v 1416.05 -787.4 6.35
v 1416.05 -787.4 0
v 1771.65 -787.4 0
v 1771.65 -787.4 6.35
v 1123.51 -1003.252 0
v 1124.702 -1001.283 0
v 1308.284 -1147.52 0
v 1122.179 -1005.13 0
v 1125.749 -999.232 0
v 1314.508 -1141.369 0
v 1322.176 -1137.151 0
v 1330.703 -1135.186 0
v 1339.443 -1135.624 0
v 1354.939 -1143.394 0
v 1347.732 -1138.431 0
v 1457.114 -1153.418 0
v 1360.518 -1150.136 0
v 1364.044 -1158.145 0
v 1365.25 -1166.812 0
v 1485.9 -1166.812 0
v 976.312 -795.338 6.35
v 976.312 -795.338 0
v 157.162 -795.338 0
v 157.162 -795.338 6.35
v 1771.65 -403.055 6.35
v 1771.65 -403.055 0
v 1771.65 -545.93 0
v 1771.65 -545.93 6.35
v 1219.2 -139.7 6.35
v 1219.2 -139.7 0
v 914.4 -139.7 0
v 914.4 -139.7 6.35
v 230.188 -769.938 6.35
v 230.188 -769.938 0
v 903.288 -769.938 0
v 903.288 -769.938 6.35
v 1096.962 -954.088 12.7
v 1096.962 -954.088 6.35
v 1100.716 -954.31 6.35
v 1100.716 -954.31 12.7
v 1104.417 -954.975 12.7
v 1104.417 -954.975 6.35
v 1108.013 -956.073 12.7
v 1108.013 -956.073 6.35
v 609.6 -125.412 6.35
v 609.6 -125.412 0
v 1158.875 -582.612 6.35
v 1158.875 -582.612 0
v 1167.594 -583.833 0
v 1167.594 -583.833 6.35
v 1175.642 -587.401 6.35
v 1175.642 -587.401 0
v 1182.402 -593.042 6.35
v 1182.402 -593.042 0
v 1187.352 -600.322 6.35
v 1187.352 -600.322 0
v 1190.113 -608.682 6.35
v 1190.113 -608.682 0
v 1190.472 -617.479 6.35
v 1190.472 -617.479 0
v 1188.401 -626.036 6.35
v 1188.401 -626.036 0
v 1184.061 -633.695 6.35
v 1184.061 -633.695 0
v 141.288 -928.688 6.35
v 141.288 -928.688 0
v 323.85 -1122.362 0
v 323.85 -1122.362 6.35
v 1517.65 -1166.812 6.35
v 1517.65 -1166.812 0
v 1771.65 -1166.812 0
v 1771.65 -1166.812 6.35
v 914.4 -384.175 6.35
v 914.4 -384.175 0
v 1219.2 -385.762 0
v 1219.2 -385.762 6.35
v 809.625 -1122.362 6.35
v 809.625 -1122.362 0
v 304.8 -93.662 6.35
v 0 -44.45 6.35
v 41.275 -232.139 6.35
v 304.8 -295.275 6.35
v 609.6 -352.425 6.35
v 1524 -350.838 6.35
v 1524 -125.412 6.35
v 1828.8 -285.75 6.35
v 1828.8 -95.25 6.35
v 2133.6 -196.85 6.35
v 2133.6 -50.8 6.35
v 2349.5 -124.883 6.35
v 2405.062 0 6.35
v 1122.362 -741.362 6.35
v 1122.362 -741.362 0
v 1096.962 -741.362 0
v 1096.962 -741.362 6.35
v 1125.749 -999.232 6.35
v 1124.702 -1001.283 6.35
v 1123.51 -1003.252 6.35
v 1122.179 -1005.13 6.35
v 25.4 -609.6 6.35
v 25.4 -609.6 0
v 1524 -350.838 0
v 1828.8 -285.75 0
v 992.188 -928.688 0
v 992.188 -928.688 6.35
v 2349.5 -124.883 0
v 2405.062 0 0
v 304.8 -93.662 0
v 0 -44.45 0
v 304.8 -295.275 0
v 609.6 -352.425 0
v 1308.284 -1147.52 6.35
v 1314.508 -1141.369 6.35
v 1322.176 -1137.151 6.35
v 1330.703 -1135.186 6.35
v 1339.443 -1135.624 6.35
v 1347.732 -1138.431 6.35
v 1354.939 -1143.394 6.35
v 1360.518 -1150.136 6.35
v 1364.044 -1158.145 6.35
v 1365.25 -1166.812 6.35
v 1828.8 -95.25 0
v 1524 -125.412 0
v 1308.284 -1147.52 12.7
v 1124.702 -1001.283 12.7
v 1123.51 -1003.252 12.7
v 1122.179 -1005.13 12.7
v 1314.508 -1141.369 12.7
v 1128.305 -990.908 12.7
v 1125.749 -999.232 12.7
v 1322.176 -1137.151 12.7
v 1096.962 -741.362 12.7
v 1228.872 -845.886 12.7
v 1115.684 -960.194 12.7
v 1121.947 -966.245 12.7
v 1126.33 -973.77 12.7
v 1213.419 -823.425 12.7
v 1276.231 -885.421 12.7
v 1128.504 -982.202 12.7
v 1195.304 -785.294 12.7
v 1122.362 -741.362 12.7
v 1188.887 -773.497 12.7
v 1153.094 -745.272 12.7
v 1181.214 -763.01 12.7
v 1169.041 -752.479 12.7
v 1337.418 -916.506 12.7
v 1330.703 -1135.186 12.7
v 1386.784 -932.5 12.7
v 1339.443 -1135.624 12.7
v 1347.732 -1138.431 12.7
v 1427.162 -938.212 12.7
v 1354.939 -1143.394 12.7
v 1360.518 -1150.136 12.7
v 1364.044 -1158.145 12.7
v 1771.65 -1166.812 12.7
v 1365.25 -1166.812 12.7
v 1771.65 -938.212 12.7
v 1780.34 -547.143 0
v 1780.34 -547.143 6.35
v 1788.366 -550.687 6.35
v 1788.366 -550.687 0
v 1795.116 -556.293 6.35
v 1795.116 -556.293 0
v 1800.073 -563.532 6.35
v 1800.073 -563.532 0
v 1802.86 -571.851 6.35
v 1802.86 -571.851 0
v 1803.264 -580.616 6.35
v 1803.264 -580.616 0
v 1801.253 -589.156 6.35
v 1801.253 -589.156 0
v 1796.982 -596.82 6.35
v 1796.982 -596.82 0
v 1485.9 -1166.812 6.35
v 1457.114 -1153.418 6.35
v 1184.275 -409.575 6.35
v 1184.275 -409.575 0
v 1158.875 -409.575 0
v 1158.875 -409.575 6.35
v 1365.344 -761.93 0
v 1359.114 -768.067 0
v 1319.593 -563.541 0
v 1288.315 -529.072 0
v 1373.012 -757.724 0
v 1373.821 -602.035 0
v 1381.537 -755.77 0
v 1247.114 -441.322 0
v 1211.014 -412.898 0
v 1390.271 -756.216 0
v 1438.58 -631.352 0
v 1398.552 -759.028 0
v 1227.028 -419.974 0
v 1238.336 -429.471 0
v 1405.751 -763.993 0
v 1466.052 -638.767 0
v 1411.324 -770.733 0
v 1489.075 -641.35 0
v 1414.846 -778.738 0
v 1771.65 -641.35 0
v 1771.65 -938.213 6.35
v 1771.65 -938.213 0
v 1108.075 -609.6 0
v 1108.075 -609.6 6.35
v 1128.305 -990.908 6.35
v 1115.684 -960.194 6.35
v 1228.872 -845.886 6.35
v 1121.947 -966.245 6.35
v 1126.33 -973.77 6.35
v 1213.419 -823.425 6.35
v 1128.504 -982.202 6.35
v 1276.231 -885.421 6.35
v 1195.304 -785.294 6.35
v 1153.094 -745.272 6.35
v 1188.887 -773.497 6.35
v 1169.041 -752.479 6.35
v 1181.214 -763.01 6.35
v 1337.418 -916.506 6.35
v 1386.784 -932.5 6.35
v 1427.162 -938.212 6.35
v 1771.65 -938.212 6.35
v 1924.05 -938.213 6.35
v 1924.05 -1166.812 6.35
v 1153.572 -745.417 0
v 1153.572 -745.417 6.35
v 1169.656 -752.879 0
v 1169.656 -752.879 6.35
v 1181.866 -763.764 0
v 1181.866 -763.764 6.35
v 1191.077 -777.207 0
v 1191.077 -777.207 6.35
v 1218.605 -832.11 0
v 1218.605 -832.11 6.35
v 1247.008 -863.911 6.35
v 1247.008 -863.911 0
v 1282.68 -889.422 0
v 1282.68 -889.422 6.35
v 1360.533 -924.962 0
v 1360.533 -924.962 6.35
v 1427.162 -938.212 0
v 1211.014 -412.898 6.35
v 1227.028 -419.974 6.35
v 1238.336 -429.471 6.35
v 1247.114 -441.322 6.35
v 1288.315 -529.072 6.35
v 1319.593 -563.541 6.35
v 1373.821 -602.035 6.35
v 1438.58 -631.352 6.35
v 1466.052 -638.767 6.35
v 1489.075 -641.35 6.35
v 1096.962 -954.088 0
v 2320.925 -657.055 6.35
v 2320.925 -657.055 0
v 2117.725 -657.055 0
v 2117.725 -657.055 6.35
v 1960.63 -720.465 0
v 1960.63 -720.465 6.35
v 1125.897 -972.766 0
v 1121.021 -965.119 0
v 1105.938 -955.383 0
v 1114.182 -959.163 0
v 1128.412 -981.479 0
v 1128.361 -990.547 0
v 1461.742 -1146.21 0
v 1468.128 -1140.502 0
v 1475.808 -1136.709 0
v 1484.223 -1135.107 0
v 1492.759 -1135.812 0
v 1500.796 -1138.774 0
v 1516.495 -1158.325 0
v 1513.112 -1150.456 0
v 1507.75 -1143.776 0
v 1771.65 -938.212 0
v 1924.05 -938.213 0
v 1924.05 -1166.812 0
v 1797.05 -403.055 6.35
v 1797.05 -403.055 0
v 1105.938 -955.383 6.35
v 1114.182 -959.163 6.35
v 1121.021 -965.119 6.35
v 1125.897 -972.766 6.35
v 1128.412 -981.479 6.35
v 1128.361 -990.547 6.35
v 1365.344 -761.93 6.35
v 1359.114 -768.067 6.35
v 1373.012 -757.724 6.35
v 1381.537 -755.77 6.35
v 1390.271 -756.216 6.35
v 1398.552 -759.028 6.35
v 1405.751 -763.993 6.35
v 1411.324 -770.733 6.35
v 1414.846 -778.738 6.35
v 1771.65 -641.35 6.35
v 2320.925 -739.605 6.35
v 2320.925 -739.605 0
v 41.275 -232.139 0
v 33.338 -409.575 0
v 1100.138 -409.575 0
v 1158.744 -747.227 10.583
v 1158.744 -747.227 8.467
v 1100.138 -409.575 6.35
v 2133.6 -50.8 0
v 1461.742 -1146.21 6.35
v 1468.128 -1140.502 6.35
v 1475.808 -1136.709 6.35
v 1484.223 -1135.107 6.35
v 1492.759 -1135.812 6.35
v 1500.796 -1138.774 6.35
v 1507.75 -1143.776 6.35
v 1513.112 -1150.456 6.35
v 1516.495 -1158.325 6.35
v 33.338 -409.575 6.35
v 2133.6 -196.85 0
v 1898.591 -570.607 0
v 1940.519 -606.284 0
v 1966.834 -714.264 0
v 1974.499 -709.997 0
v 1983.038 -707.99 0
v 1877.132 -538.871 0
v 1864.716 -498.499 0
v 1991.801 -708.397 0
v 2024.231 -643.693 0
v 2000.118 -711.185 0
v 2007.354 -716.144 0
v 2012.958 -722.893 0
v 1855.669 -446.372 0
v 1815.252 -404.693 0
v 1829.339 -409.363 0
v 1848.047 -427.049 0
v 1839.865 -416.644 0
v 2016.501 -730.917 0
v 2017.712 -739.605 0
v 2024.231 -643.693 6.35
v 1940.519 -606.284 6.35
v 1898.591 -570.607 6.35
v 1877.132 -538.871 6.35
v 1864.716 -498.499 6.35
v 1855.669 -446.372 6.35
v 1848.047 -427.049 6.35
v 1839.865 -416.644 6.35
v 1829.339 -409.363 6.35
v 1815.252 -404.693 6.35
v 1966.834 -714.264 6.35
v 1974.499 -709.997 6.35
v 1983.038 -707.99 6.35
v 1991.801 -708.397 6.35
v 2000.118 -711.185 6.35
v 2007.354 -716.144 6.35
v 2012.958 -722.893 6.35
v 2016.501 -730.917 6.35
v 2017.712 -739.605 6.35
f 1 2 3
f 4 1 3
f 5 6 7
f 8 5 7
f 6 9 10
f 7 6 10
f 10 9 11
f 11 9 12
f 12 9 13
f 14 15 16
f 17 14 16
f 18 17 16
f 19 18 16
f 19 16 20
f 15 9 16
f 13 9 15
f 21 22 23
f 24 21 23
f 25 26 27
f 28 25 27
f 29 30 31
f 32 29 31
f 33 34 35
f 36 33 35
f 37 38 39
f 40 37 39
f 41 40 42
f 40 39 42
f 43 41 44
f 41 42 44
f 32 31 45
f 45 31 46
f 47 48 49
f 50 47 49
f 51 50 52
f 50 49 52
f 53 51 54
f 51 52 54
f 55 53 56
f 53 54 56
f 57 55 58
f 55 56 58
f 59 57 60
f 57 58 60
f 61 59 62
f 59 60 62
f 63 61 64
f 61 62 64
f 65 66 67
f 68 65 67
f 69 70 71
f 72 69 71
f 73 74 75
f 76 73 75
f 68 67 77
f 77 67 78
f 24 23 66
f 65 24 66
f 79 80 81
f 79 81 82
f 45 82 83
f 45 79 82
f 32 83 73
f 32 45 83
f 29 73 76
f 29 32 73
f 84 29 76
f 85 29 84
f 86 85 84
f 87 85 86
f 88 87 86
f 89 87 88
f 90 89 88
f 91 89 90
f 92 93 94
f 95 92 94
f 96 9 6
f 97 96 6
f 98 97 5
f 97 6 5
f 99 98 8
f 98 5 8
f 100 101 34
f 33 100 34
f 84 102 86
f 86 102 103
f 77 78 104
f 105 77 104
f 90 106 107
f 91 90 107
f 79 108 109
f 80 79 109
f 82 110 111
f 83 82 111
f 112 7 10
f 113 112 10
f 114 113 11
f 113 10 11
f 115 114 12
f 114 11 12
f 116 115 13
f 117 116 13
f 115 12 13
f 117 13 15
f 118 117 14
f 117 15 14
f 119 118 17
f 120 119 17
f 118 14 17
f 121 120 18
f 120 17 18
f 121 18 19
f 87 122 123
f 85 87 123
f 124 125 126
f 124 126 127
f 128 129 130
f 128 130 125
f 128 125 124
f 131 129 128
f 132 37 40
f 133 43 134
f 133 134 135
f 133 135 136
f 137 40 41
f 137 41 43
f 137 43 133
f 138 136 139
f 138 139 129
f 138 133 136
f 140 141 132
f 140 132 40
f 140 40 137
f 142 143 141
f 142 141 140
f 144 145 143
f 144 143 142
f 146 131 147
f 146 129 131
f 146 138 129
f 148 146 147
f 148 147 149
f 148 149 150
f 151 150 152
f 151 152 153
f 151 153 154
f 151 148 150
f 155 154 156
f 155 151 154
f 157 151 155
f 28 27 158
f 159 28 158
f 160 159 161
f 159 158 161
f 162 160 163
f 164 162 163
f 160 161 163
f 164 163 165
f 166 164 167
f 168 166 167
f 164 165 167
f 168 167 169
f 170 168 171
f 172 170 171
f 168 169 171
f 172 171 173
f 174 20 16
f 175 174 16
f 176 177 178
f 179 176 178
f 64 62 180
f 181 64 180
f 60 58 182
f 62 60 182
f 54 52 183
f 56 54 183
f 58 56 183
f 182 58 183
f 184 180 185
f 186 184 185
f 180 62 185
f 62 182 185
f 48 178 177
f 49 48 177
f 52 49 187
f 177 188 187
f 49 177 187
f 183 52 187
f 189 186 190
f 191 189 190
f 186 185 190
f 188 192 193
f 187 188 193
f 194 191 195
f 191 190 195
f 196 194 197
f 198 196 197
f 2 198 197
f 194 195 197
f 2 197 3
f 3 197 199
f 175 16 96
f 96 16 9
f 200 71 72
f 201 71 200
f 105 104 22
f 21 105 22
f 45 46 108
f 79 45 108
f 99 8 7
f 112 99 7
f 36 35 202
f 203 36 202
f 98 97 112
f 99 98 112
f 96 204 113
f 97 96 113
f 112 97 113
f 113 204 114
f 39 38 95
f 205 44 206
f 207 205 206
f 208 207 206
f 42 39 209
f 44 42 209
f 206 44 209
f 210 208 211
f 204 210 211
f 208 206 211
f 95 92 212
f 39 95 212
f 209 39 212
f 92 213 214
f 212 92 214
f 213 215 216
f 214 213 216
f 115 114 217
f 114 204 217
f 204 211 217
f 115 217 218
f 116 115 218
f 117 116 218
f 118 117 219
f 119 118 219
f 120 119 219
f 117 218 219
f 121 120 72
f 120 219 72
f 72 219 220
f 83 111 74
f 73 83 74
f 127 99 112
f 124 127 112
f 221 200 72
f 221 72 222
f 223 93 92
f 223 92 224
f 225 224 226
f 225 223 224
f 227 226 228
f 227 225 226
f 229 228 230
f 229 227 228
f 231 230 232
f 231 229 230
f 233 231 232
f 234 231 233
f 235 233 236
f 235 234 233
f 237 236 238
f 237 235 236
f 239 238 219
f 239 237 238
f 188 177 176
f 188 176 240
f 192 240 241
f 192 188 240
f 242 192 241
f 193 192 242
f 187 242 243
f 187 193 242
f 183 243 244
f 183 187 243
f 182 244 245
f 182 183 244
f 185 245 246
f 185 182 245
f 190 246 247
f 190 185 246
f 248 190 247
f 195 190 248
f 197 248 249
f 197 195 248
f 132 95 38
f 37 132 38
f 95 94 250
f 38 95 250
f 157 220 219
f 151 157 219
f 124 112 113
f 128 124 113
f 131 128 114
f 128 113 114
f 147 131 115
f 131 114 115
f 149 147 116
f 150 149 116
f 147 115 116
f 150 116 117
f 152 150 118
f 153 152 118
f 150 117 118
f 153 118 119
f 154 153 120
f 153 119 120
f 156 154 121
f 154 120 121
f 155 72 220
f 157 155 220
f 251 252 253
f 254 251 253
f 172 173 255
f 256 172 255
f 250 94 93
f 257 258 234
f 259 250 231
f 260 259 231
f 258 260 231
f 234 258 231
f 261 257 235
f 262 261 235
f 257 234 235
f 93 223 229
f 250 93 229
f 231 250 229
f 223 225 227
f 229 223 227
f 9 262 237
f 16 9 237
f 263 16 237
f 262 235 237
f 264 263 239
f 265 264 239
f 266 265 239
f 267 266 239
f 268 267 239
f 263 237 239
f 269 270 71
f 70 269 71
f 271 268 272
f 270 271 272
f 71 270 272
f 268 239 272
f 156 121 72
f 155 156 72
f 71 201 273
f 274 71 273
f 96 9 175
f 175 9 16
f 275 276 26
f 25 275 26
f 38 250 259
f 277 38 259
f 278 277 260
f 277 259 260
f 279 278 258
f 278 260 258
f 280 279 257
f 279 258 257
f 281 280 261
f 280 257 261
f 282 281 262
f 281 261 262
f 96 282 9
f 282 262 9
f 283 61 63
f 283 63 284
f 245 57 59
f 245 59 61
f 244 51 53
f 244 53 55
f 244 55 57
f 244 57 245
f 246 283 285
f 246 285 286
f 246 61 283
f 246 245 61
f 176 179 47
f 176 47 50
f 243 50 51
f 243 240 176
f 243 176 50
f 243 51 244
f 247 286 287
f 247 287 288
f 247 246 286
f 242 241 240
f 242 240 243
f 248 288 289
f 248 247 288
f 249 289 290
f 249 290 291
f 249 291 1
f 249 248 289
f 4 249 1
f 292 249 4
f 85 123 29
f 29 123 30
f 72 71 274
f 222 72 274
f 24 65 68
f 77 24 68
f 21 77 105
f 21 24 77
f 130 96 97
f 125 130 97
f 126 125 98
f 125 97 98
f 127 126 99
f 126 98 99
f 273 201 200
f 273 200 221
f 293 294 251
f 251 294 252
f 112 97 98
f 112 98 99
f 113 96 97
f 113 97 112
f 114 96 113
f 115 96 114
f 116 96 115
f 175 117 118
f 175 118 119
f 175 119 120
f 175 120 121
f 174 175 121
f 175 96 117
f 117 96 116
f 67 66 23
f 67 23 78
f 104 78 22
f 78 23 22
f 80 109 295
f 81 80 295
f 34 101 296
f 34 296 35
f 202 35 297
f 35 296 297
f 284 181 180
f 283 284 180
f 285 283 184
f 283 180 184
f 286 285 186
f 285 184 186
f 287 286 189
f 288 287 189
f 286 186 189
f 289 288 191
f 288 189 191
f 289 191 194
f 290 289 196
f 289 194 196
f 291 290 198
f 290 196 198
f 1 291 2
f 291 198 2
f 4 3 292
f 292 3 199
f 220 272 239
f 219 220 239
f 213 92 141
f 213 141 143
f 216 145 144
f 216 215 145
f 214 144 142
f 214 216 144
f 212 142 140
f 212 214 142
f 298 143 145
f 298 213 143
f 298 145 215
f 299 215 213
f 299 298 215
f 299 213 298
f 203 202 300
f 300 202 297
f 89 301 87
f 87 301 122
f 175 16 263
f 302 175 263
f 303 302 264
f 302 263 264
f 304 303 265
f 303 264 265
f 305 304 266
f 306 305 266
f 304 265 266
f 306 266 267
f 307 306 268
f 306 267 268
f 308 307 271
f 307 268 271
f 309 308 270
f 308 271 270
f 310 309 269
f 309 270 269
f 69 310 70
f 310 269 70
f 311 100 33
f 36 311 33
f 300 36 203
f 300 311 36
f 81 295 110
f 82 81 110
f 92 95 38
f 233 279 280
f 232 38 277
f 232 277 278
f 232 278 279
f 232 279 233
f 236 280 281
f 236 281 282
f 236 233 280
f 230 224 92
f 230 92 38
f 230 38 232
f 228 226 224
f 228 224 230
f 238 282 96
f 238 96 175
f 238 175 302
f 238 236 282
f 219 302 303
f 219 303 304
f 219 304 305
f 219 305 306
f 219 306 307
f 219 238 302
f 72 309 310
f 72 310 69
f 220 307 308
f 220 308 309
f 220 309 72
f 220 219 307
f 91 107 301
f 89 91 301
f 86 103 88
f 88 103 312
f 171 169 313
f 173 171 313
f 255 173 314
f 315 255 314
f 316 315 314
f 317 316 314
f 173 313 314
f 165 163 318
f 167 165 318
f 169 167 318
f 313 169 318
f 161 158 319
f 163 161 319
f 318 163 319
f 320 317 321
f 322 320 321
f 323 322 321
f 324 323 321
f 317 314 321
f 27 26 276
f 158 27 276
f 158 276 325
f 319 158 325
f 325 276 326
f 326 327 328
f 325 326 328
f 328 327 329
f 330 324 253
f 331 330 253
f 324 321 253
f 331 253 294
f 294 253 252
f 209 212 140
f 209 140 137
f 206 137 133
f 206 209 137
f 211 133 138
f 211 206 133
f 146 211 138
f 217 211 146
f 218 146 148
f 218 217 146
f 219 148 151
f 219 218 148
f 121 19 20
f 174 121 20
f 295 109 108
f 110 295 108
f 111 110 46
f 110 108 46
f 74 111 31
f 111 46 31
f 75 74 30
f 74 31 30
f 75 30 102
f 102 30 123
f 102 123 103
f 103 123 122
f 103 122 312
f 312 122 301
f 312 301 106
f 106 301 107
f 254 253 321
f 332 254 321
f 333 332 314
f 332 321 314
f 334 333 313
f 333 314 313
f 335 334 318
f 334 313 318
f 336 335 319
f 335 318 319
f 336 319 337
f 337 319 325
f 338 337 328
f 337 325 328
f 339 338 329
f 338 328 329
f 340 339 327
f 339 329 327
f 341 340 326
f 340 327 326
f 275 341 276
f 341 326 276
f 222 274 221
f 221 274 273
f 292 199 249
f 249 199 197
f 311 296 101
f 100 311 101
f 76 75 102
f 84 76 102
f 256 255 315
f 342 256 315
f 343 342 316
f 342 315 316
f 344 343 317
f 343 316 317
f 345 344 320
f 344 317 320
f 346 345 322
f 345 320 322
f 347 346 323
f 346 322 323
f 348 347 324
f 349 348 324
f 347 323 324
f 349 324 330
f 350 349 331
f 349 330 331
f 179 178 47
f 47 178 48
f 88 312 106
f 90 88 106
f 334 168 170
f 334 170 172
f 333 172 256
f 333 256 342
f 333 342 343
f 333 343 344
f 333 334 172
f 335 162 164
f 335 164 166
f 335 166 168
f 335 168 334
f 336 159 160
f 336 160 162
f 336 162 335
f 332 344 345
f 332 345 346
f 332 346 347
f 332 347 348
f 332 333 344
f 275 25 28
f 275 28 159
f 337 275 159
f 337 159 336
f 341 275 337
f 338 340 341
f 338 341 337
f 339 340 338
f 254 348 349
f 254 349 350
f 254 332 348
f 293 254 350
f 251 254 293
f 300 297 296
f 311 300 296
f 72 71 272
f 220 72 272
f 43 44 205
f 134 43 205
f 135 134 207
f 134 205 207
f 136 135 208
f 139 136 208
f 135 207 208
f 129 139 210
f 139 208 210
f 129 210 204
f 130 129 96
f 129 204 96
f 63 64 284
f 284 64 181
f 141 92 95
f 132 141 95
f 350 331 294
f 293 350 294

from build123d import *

# Parameters (mm, degrees)
F1_DEPTH = 6.35
F2_DEPTH = 6.35
F0_W     = 152.4
F0_H     = 228.6
F5_DEPTH = 6.35


with BuildPart() as f1:
    # F0 (on Top) → F1 (new body)
    with BuildSketch(Plane.XY):
        with BuildLine():
            Line((1184.275, -409.575), (1158.875, -409.575))
            Line((1158.875, -409.575), (1158.875, -582.6125))
            ThreePointArc((1158.875, -582.6125), (1187.3519406863, -600.3223308717), (1184.0605788026, -633.6950921795))
            Line((1184.0605788026, -633.6950921795), (1359.1144211974, -768.0674078205))
            ThreePointArc((1359.1144211974, -768.0674078205), (1394.5083390671, -757.3358633337), (1416.05, -787.4))
            Line((1416.05, -787.4), (1771.65, -787.4))
            Line((1771.65, -787.4), (1771.65, -641.35))
            Line((1771.65, -641.35), (1489.075, -641.35))
            add(Edge.make_bspline(
                [(1184.275, -409.575), (1260.475, -409.575), (1239.6705562427, -549.8166383278), (1438.275, -641.35), (1489.075, -641.35)],
                knots=[0, 0, 0, 0, 0.4480292942, 1, 1, 1, 1], degree=3))
        make_face()
    extrude(amount=F1_DEPTH)


with BuildPart() as f1b:
    # F0 (on Top) → F1, piece 2 (new body)
    with BuildSketch(Plane.XY):
        with BuildLine():
            Line((1517.65, -1166.8125), (1771.65, -1166.8125))
            Line((1771.65, -1166.8125), (1771.65, -938.2125))
            Line((1771.65, -938.2125), (1427.1625, -938.2125))
            add(Edge.make_bspline(
                [(1122.3625, -741.3625), (1198.5625, -741.3625), (1179.69287535, -863.0083351522), (1376.3625, -938.2125), (1427.1625, -938.2125)],
                knots=[0, 0, 0, 0, 0.441817609, 1, 1, 1, 1], degree=3))
            Line((1122.3625, -741.3625), (1096.9625, -741.3625))
            Line((1096.9625, -741.3625), (1096.9625, -954.0875))
            ThreePointArc((1096.9625, -954.0875), (1123.7331565008, -968.7672202566), (1125.7488052209, -999.231944062))
            Line((1125.7488052209, -999.231944062), (1457.1136947791, -1153.418055938))
            ThreePointArc((1457.1136947791, -1153.418055938), (1492.7592021853, -1135.8122766882), (1517.65, -1166.8125))
        make_face()
    extrude(amount=F1_DEPTH)


with BuildPart() as f1c:
    # F0 (on Top) → F1, piece 3 (new body)
    with BuildSketch(Plane.XY):
        with BuildLine():
            Line((1797.05, -403.0552663527), (1771.65, -403.0552663527))
            Line((1771.65, -403.0552663527), (1771.65, -545.9302663527))
            ThreePointArc((1771.65, -545.9302663527), (1800.0731941464, -563.5316079528), (1796.9822875345, -596.8202169344))
            Line((1796.9822875345, -596.8202169344), (1960.6302124655, -720.4653157711))
            ThreePointArc((1960.6302124655, -720.4653157711), (1996.0561210247, -709.5024207296), (2017.7125, -739.6052663527))
            Line((2017.7125, -739.6052663527), (2320.925, -739.6052663527))
            Line((2320.925, -739.6052663527), (2320.925, -657.0552663527))
            Line((2320.925, -657.0552663527), (2117.725, -657.0552663527))
            add(Edge.make_bspline(
                [(2117.725, -657.0552663527), (2016.125, -657.0552663527), (1820.8710671265, -570.1012868563), (1873.25, -403.0552663527), (1797.05, -403.0552663527)],
                knots=[0, 0, 0, 0, 0.5769629955, 1, 1, 1, 1], degree=3))
        make_face()
    extrude(amount=F1_DEPTH)


with BuildPart() as f1d:
    # F0 (on Top) → F1, piece 4 (new body)
    with BuildSketch(Plane.XY):
        Polygon((976.3125, -795.3375), (566.7375, -795.3375), (157.1625, -795.3375), (141.2875, -928.6875), (323.85, -1122.3625), (566.7375, -1122.3625), (809.625, -1122.3625), (992.1875, -928.6875), align=None)
    extrude(amount=F1_DEPTH)


with BuildPart() as f1e:
    # F0 (on Top) → F1, piece 5 (new body)
    with BuildSketch(Plane.XY):
        Polygon((566.7375, -409.575), (33.3375, -409.575), (25.4, -609.6), (230.1875, -769.9375), (566.7375, -769.9375), (903.2875, -769.9375), (1108.075, -609.6), (1100.1375, -409.575), align=None)
    extrude(amount=F1_DEPTH)


with BuildPart() as f1f:
    # F0 (on Top) → F1, piece 6 (new body)
    with BuildSketch(Plane.XY):
        Polygon((304.8, -93.6625), (0, -44.45), (41.275, -232.1388020833), (304.8, -295.275), (609.6, -352.425), (914.4, -384.175), (1219.2, -385.7625), (1524, -350.8375), (1828.8, -285.75), (2133.6, -196.85), (2349.5, -124.8833333333), (2405.0625, 0), (2133.6, -50.8), (1828.8, -95.25), (1524, -125.4125), (1219.2, -139.7), (914.4, -139.7), (609.6, -125.4125), align=None)
    extrude(amount=F1_DEPTH)


with BuildPart() as f2:
    # F0 (on Top) → F2 (new body)
    with BuildSketch(Plane.XY):
        with BuildLine():
            Line((1365.25, -1166.8125), (1485.9, -1166.8125))
            Line((1485.9, -1166.8125), (1457.1136947791, -1153.418055938))
            Line((1457.1136947791, -1153.418055938), (1125.7488052209, -999.231944062))
            ThreePointArc((1125.7488052209, -999.231944062), (1124.124265246, -1002.2783335774), (1122.1785567933, -1005.130321976))
            Line((1122.1785567933, -1005.130321976), (1308.2839432067, -1147.519678024))
            ThreePointArc((1308.2839432067, -1147.519678024), (1343.6846133165, -1136.740317645), (1365.25, -1166.8125))
        make_face()
    extrude(amount=F2_DEPTH)


with BuildPart() as f2b:
    # F0 (on Top) → F2, piece 2 (new body)
    with BuildSketch(Plane.XY):
        with Locations((1847.85, -1052.5125)):
            Rectangle(F0_W, F0_H)
    extrude(amount=F2_DEPTH)


with BuildPart() as f5:
    # F4 (on face) → F5 (new body)
    with BuildSketch(Plane.XY.offset(6.35)):
        with BuildLine():
            Line((1096.9625, -741.3625), (1096.9625, -954.0875))
            ThreePointArc((1096.9625, -954.0875), (1102.5763225769, -954.5877400637), (1108.0132469514, -956.0726970977))
            Line((1108.0132469514, -956.0726970977), (1675.633582901, -1166.8125))
            Line((1675.633582901, -1166.8125), (1771.65, -1166.8125))
            Line((1771.65, -1166.8125), (1771.65, -938.2125))
            Line((1771.65, -938.2125), (1427.1625, -938.2125))
            add(Edge.make_bspline(
                [(1195.3044928639, -785.2942482262), (1188.3905985456, -810.7493696117), (1146.6295208593, -926.9508572649), (1326.0216633776, -937.4958061878), (1411.7701730659, -939.0812615273), (1427.1625, -938.2125)],
                knots=[127.292389292, 127.292389292, 127.292389292, 127.292389292, 199.3006577737, 409.8585065241, 460.6585065241, 460.6585065241, 460.6585065241, 460.6585065241], degree=3))
            add(Edge.make_bspline(
                [(1122.3625, -741.3625), (1167.7508107351, -741.3625), (1183.1457987153, -760.4310803701), (1195.3044928639, -785.2942482262)],
                knots=[0, 0, 0, 0, 0.2631673875, 0.2631673875, 0.2631673875, 0.2631673875], degree=3))
            Line((1122.3625, -741.3625), (1096.9625, -741.3625))
        make_face()
        with BuildLine():
            Line((1675.633582901, -1166.8125), (1108.0132469514, -956.0726970977))
            ThreePointArc((1108.0132469514, -956.0726970977), (1126.3296216001, -973.7695810028), (1125.7488052209, -999.231944062))
            ThreePointArc((1125.7488052209, -999.231944062), (1124.124265246, -1002.2783335774), (1122.1785567933, -1005.130321976))
            Line((1122.1785567933, -1005.130321976), (1308.2839432067, -1147.519678024))
            ThreePointArc((1308.2839432067, -1147.519678024), (1343.6846133165, -1136.740317645), (1365.25, -1166.8125))
            Line((1365.25, -1166.8125), (1485.9, -1166.8125))
            Line((1485.9, -1166.8125), (1517.65, -1166.8125))
            Line((1517.65, -1166.8125), (1675.633582901, -1166.8125))
        make_face()
        with BuildLine():
            add(Edge.make_bspline(
                [(1195.3044928639, -785.2942482262), (1203.5583780583, -802.1725190786), (1231.4499066642, -882.7996187422), (1376.3625, -938.2125), (1427.1625, -938.2125)],
                knots=[0.2631673875, 0.2631673875, 0.2631673875, 0.2631673875, 0.441817609, 1, 1, 1, 1], degree=3))
            add(Edge.make_bspline(
                [(1195.3044928639, -785.2942482262), (1188.3905985456, -810.7493696117), (1146.6295208593, -926.9508572649), (1326.0216633776, -937.4958061878), (1411.7701730659, -939.0812615273), (1427.1625, -938.2125)],
                knots=[127.292389292, 127.292389292, 127.292389292, 127.292389292, 199.3006577737, 409.8585065241, 460.6585065241, 460.6585065241, 460.6585065241, 460.6585065241], degree=3))
        make_face()
    extrude(amount=F5_DEPTH)


solid = Compound([f1.part, f1b.part, f1c.part, f1d.part, f1e.part, f1f.part, f2.part, f2b.part, f5.part])
